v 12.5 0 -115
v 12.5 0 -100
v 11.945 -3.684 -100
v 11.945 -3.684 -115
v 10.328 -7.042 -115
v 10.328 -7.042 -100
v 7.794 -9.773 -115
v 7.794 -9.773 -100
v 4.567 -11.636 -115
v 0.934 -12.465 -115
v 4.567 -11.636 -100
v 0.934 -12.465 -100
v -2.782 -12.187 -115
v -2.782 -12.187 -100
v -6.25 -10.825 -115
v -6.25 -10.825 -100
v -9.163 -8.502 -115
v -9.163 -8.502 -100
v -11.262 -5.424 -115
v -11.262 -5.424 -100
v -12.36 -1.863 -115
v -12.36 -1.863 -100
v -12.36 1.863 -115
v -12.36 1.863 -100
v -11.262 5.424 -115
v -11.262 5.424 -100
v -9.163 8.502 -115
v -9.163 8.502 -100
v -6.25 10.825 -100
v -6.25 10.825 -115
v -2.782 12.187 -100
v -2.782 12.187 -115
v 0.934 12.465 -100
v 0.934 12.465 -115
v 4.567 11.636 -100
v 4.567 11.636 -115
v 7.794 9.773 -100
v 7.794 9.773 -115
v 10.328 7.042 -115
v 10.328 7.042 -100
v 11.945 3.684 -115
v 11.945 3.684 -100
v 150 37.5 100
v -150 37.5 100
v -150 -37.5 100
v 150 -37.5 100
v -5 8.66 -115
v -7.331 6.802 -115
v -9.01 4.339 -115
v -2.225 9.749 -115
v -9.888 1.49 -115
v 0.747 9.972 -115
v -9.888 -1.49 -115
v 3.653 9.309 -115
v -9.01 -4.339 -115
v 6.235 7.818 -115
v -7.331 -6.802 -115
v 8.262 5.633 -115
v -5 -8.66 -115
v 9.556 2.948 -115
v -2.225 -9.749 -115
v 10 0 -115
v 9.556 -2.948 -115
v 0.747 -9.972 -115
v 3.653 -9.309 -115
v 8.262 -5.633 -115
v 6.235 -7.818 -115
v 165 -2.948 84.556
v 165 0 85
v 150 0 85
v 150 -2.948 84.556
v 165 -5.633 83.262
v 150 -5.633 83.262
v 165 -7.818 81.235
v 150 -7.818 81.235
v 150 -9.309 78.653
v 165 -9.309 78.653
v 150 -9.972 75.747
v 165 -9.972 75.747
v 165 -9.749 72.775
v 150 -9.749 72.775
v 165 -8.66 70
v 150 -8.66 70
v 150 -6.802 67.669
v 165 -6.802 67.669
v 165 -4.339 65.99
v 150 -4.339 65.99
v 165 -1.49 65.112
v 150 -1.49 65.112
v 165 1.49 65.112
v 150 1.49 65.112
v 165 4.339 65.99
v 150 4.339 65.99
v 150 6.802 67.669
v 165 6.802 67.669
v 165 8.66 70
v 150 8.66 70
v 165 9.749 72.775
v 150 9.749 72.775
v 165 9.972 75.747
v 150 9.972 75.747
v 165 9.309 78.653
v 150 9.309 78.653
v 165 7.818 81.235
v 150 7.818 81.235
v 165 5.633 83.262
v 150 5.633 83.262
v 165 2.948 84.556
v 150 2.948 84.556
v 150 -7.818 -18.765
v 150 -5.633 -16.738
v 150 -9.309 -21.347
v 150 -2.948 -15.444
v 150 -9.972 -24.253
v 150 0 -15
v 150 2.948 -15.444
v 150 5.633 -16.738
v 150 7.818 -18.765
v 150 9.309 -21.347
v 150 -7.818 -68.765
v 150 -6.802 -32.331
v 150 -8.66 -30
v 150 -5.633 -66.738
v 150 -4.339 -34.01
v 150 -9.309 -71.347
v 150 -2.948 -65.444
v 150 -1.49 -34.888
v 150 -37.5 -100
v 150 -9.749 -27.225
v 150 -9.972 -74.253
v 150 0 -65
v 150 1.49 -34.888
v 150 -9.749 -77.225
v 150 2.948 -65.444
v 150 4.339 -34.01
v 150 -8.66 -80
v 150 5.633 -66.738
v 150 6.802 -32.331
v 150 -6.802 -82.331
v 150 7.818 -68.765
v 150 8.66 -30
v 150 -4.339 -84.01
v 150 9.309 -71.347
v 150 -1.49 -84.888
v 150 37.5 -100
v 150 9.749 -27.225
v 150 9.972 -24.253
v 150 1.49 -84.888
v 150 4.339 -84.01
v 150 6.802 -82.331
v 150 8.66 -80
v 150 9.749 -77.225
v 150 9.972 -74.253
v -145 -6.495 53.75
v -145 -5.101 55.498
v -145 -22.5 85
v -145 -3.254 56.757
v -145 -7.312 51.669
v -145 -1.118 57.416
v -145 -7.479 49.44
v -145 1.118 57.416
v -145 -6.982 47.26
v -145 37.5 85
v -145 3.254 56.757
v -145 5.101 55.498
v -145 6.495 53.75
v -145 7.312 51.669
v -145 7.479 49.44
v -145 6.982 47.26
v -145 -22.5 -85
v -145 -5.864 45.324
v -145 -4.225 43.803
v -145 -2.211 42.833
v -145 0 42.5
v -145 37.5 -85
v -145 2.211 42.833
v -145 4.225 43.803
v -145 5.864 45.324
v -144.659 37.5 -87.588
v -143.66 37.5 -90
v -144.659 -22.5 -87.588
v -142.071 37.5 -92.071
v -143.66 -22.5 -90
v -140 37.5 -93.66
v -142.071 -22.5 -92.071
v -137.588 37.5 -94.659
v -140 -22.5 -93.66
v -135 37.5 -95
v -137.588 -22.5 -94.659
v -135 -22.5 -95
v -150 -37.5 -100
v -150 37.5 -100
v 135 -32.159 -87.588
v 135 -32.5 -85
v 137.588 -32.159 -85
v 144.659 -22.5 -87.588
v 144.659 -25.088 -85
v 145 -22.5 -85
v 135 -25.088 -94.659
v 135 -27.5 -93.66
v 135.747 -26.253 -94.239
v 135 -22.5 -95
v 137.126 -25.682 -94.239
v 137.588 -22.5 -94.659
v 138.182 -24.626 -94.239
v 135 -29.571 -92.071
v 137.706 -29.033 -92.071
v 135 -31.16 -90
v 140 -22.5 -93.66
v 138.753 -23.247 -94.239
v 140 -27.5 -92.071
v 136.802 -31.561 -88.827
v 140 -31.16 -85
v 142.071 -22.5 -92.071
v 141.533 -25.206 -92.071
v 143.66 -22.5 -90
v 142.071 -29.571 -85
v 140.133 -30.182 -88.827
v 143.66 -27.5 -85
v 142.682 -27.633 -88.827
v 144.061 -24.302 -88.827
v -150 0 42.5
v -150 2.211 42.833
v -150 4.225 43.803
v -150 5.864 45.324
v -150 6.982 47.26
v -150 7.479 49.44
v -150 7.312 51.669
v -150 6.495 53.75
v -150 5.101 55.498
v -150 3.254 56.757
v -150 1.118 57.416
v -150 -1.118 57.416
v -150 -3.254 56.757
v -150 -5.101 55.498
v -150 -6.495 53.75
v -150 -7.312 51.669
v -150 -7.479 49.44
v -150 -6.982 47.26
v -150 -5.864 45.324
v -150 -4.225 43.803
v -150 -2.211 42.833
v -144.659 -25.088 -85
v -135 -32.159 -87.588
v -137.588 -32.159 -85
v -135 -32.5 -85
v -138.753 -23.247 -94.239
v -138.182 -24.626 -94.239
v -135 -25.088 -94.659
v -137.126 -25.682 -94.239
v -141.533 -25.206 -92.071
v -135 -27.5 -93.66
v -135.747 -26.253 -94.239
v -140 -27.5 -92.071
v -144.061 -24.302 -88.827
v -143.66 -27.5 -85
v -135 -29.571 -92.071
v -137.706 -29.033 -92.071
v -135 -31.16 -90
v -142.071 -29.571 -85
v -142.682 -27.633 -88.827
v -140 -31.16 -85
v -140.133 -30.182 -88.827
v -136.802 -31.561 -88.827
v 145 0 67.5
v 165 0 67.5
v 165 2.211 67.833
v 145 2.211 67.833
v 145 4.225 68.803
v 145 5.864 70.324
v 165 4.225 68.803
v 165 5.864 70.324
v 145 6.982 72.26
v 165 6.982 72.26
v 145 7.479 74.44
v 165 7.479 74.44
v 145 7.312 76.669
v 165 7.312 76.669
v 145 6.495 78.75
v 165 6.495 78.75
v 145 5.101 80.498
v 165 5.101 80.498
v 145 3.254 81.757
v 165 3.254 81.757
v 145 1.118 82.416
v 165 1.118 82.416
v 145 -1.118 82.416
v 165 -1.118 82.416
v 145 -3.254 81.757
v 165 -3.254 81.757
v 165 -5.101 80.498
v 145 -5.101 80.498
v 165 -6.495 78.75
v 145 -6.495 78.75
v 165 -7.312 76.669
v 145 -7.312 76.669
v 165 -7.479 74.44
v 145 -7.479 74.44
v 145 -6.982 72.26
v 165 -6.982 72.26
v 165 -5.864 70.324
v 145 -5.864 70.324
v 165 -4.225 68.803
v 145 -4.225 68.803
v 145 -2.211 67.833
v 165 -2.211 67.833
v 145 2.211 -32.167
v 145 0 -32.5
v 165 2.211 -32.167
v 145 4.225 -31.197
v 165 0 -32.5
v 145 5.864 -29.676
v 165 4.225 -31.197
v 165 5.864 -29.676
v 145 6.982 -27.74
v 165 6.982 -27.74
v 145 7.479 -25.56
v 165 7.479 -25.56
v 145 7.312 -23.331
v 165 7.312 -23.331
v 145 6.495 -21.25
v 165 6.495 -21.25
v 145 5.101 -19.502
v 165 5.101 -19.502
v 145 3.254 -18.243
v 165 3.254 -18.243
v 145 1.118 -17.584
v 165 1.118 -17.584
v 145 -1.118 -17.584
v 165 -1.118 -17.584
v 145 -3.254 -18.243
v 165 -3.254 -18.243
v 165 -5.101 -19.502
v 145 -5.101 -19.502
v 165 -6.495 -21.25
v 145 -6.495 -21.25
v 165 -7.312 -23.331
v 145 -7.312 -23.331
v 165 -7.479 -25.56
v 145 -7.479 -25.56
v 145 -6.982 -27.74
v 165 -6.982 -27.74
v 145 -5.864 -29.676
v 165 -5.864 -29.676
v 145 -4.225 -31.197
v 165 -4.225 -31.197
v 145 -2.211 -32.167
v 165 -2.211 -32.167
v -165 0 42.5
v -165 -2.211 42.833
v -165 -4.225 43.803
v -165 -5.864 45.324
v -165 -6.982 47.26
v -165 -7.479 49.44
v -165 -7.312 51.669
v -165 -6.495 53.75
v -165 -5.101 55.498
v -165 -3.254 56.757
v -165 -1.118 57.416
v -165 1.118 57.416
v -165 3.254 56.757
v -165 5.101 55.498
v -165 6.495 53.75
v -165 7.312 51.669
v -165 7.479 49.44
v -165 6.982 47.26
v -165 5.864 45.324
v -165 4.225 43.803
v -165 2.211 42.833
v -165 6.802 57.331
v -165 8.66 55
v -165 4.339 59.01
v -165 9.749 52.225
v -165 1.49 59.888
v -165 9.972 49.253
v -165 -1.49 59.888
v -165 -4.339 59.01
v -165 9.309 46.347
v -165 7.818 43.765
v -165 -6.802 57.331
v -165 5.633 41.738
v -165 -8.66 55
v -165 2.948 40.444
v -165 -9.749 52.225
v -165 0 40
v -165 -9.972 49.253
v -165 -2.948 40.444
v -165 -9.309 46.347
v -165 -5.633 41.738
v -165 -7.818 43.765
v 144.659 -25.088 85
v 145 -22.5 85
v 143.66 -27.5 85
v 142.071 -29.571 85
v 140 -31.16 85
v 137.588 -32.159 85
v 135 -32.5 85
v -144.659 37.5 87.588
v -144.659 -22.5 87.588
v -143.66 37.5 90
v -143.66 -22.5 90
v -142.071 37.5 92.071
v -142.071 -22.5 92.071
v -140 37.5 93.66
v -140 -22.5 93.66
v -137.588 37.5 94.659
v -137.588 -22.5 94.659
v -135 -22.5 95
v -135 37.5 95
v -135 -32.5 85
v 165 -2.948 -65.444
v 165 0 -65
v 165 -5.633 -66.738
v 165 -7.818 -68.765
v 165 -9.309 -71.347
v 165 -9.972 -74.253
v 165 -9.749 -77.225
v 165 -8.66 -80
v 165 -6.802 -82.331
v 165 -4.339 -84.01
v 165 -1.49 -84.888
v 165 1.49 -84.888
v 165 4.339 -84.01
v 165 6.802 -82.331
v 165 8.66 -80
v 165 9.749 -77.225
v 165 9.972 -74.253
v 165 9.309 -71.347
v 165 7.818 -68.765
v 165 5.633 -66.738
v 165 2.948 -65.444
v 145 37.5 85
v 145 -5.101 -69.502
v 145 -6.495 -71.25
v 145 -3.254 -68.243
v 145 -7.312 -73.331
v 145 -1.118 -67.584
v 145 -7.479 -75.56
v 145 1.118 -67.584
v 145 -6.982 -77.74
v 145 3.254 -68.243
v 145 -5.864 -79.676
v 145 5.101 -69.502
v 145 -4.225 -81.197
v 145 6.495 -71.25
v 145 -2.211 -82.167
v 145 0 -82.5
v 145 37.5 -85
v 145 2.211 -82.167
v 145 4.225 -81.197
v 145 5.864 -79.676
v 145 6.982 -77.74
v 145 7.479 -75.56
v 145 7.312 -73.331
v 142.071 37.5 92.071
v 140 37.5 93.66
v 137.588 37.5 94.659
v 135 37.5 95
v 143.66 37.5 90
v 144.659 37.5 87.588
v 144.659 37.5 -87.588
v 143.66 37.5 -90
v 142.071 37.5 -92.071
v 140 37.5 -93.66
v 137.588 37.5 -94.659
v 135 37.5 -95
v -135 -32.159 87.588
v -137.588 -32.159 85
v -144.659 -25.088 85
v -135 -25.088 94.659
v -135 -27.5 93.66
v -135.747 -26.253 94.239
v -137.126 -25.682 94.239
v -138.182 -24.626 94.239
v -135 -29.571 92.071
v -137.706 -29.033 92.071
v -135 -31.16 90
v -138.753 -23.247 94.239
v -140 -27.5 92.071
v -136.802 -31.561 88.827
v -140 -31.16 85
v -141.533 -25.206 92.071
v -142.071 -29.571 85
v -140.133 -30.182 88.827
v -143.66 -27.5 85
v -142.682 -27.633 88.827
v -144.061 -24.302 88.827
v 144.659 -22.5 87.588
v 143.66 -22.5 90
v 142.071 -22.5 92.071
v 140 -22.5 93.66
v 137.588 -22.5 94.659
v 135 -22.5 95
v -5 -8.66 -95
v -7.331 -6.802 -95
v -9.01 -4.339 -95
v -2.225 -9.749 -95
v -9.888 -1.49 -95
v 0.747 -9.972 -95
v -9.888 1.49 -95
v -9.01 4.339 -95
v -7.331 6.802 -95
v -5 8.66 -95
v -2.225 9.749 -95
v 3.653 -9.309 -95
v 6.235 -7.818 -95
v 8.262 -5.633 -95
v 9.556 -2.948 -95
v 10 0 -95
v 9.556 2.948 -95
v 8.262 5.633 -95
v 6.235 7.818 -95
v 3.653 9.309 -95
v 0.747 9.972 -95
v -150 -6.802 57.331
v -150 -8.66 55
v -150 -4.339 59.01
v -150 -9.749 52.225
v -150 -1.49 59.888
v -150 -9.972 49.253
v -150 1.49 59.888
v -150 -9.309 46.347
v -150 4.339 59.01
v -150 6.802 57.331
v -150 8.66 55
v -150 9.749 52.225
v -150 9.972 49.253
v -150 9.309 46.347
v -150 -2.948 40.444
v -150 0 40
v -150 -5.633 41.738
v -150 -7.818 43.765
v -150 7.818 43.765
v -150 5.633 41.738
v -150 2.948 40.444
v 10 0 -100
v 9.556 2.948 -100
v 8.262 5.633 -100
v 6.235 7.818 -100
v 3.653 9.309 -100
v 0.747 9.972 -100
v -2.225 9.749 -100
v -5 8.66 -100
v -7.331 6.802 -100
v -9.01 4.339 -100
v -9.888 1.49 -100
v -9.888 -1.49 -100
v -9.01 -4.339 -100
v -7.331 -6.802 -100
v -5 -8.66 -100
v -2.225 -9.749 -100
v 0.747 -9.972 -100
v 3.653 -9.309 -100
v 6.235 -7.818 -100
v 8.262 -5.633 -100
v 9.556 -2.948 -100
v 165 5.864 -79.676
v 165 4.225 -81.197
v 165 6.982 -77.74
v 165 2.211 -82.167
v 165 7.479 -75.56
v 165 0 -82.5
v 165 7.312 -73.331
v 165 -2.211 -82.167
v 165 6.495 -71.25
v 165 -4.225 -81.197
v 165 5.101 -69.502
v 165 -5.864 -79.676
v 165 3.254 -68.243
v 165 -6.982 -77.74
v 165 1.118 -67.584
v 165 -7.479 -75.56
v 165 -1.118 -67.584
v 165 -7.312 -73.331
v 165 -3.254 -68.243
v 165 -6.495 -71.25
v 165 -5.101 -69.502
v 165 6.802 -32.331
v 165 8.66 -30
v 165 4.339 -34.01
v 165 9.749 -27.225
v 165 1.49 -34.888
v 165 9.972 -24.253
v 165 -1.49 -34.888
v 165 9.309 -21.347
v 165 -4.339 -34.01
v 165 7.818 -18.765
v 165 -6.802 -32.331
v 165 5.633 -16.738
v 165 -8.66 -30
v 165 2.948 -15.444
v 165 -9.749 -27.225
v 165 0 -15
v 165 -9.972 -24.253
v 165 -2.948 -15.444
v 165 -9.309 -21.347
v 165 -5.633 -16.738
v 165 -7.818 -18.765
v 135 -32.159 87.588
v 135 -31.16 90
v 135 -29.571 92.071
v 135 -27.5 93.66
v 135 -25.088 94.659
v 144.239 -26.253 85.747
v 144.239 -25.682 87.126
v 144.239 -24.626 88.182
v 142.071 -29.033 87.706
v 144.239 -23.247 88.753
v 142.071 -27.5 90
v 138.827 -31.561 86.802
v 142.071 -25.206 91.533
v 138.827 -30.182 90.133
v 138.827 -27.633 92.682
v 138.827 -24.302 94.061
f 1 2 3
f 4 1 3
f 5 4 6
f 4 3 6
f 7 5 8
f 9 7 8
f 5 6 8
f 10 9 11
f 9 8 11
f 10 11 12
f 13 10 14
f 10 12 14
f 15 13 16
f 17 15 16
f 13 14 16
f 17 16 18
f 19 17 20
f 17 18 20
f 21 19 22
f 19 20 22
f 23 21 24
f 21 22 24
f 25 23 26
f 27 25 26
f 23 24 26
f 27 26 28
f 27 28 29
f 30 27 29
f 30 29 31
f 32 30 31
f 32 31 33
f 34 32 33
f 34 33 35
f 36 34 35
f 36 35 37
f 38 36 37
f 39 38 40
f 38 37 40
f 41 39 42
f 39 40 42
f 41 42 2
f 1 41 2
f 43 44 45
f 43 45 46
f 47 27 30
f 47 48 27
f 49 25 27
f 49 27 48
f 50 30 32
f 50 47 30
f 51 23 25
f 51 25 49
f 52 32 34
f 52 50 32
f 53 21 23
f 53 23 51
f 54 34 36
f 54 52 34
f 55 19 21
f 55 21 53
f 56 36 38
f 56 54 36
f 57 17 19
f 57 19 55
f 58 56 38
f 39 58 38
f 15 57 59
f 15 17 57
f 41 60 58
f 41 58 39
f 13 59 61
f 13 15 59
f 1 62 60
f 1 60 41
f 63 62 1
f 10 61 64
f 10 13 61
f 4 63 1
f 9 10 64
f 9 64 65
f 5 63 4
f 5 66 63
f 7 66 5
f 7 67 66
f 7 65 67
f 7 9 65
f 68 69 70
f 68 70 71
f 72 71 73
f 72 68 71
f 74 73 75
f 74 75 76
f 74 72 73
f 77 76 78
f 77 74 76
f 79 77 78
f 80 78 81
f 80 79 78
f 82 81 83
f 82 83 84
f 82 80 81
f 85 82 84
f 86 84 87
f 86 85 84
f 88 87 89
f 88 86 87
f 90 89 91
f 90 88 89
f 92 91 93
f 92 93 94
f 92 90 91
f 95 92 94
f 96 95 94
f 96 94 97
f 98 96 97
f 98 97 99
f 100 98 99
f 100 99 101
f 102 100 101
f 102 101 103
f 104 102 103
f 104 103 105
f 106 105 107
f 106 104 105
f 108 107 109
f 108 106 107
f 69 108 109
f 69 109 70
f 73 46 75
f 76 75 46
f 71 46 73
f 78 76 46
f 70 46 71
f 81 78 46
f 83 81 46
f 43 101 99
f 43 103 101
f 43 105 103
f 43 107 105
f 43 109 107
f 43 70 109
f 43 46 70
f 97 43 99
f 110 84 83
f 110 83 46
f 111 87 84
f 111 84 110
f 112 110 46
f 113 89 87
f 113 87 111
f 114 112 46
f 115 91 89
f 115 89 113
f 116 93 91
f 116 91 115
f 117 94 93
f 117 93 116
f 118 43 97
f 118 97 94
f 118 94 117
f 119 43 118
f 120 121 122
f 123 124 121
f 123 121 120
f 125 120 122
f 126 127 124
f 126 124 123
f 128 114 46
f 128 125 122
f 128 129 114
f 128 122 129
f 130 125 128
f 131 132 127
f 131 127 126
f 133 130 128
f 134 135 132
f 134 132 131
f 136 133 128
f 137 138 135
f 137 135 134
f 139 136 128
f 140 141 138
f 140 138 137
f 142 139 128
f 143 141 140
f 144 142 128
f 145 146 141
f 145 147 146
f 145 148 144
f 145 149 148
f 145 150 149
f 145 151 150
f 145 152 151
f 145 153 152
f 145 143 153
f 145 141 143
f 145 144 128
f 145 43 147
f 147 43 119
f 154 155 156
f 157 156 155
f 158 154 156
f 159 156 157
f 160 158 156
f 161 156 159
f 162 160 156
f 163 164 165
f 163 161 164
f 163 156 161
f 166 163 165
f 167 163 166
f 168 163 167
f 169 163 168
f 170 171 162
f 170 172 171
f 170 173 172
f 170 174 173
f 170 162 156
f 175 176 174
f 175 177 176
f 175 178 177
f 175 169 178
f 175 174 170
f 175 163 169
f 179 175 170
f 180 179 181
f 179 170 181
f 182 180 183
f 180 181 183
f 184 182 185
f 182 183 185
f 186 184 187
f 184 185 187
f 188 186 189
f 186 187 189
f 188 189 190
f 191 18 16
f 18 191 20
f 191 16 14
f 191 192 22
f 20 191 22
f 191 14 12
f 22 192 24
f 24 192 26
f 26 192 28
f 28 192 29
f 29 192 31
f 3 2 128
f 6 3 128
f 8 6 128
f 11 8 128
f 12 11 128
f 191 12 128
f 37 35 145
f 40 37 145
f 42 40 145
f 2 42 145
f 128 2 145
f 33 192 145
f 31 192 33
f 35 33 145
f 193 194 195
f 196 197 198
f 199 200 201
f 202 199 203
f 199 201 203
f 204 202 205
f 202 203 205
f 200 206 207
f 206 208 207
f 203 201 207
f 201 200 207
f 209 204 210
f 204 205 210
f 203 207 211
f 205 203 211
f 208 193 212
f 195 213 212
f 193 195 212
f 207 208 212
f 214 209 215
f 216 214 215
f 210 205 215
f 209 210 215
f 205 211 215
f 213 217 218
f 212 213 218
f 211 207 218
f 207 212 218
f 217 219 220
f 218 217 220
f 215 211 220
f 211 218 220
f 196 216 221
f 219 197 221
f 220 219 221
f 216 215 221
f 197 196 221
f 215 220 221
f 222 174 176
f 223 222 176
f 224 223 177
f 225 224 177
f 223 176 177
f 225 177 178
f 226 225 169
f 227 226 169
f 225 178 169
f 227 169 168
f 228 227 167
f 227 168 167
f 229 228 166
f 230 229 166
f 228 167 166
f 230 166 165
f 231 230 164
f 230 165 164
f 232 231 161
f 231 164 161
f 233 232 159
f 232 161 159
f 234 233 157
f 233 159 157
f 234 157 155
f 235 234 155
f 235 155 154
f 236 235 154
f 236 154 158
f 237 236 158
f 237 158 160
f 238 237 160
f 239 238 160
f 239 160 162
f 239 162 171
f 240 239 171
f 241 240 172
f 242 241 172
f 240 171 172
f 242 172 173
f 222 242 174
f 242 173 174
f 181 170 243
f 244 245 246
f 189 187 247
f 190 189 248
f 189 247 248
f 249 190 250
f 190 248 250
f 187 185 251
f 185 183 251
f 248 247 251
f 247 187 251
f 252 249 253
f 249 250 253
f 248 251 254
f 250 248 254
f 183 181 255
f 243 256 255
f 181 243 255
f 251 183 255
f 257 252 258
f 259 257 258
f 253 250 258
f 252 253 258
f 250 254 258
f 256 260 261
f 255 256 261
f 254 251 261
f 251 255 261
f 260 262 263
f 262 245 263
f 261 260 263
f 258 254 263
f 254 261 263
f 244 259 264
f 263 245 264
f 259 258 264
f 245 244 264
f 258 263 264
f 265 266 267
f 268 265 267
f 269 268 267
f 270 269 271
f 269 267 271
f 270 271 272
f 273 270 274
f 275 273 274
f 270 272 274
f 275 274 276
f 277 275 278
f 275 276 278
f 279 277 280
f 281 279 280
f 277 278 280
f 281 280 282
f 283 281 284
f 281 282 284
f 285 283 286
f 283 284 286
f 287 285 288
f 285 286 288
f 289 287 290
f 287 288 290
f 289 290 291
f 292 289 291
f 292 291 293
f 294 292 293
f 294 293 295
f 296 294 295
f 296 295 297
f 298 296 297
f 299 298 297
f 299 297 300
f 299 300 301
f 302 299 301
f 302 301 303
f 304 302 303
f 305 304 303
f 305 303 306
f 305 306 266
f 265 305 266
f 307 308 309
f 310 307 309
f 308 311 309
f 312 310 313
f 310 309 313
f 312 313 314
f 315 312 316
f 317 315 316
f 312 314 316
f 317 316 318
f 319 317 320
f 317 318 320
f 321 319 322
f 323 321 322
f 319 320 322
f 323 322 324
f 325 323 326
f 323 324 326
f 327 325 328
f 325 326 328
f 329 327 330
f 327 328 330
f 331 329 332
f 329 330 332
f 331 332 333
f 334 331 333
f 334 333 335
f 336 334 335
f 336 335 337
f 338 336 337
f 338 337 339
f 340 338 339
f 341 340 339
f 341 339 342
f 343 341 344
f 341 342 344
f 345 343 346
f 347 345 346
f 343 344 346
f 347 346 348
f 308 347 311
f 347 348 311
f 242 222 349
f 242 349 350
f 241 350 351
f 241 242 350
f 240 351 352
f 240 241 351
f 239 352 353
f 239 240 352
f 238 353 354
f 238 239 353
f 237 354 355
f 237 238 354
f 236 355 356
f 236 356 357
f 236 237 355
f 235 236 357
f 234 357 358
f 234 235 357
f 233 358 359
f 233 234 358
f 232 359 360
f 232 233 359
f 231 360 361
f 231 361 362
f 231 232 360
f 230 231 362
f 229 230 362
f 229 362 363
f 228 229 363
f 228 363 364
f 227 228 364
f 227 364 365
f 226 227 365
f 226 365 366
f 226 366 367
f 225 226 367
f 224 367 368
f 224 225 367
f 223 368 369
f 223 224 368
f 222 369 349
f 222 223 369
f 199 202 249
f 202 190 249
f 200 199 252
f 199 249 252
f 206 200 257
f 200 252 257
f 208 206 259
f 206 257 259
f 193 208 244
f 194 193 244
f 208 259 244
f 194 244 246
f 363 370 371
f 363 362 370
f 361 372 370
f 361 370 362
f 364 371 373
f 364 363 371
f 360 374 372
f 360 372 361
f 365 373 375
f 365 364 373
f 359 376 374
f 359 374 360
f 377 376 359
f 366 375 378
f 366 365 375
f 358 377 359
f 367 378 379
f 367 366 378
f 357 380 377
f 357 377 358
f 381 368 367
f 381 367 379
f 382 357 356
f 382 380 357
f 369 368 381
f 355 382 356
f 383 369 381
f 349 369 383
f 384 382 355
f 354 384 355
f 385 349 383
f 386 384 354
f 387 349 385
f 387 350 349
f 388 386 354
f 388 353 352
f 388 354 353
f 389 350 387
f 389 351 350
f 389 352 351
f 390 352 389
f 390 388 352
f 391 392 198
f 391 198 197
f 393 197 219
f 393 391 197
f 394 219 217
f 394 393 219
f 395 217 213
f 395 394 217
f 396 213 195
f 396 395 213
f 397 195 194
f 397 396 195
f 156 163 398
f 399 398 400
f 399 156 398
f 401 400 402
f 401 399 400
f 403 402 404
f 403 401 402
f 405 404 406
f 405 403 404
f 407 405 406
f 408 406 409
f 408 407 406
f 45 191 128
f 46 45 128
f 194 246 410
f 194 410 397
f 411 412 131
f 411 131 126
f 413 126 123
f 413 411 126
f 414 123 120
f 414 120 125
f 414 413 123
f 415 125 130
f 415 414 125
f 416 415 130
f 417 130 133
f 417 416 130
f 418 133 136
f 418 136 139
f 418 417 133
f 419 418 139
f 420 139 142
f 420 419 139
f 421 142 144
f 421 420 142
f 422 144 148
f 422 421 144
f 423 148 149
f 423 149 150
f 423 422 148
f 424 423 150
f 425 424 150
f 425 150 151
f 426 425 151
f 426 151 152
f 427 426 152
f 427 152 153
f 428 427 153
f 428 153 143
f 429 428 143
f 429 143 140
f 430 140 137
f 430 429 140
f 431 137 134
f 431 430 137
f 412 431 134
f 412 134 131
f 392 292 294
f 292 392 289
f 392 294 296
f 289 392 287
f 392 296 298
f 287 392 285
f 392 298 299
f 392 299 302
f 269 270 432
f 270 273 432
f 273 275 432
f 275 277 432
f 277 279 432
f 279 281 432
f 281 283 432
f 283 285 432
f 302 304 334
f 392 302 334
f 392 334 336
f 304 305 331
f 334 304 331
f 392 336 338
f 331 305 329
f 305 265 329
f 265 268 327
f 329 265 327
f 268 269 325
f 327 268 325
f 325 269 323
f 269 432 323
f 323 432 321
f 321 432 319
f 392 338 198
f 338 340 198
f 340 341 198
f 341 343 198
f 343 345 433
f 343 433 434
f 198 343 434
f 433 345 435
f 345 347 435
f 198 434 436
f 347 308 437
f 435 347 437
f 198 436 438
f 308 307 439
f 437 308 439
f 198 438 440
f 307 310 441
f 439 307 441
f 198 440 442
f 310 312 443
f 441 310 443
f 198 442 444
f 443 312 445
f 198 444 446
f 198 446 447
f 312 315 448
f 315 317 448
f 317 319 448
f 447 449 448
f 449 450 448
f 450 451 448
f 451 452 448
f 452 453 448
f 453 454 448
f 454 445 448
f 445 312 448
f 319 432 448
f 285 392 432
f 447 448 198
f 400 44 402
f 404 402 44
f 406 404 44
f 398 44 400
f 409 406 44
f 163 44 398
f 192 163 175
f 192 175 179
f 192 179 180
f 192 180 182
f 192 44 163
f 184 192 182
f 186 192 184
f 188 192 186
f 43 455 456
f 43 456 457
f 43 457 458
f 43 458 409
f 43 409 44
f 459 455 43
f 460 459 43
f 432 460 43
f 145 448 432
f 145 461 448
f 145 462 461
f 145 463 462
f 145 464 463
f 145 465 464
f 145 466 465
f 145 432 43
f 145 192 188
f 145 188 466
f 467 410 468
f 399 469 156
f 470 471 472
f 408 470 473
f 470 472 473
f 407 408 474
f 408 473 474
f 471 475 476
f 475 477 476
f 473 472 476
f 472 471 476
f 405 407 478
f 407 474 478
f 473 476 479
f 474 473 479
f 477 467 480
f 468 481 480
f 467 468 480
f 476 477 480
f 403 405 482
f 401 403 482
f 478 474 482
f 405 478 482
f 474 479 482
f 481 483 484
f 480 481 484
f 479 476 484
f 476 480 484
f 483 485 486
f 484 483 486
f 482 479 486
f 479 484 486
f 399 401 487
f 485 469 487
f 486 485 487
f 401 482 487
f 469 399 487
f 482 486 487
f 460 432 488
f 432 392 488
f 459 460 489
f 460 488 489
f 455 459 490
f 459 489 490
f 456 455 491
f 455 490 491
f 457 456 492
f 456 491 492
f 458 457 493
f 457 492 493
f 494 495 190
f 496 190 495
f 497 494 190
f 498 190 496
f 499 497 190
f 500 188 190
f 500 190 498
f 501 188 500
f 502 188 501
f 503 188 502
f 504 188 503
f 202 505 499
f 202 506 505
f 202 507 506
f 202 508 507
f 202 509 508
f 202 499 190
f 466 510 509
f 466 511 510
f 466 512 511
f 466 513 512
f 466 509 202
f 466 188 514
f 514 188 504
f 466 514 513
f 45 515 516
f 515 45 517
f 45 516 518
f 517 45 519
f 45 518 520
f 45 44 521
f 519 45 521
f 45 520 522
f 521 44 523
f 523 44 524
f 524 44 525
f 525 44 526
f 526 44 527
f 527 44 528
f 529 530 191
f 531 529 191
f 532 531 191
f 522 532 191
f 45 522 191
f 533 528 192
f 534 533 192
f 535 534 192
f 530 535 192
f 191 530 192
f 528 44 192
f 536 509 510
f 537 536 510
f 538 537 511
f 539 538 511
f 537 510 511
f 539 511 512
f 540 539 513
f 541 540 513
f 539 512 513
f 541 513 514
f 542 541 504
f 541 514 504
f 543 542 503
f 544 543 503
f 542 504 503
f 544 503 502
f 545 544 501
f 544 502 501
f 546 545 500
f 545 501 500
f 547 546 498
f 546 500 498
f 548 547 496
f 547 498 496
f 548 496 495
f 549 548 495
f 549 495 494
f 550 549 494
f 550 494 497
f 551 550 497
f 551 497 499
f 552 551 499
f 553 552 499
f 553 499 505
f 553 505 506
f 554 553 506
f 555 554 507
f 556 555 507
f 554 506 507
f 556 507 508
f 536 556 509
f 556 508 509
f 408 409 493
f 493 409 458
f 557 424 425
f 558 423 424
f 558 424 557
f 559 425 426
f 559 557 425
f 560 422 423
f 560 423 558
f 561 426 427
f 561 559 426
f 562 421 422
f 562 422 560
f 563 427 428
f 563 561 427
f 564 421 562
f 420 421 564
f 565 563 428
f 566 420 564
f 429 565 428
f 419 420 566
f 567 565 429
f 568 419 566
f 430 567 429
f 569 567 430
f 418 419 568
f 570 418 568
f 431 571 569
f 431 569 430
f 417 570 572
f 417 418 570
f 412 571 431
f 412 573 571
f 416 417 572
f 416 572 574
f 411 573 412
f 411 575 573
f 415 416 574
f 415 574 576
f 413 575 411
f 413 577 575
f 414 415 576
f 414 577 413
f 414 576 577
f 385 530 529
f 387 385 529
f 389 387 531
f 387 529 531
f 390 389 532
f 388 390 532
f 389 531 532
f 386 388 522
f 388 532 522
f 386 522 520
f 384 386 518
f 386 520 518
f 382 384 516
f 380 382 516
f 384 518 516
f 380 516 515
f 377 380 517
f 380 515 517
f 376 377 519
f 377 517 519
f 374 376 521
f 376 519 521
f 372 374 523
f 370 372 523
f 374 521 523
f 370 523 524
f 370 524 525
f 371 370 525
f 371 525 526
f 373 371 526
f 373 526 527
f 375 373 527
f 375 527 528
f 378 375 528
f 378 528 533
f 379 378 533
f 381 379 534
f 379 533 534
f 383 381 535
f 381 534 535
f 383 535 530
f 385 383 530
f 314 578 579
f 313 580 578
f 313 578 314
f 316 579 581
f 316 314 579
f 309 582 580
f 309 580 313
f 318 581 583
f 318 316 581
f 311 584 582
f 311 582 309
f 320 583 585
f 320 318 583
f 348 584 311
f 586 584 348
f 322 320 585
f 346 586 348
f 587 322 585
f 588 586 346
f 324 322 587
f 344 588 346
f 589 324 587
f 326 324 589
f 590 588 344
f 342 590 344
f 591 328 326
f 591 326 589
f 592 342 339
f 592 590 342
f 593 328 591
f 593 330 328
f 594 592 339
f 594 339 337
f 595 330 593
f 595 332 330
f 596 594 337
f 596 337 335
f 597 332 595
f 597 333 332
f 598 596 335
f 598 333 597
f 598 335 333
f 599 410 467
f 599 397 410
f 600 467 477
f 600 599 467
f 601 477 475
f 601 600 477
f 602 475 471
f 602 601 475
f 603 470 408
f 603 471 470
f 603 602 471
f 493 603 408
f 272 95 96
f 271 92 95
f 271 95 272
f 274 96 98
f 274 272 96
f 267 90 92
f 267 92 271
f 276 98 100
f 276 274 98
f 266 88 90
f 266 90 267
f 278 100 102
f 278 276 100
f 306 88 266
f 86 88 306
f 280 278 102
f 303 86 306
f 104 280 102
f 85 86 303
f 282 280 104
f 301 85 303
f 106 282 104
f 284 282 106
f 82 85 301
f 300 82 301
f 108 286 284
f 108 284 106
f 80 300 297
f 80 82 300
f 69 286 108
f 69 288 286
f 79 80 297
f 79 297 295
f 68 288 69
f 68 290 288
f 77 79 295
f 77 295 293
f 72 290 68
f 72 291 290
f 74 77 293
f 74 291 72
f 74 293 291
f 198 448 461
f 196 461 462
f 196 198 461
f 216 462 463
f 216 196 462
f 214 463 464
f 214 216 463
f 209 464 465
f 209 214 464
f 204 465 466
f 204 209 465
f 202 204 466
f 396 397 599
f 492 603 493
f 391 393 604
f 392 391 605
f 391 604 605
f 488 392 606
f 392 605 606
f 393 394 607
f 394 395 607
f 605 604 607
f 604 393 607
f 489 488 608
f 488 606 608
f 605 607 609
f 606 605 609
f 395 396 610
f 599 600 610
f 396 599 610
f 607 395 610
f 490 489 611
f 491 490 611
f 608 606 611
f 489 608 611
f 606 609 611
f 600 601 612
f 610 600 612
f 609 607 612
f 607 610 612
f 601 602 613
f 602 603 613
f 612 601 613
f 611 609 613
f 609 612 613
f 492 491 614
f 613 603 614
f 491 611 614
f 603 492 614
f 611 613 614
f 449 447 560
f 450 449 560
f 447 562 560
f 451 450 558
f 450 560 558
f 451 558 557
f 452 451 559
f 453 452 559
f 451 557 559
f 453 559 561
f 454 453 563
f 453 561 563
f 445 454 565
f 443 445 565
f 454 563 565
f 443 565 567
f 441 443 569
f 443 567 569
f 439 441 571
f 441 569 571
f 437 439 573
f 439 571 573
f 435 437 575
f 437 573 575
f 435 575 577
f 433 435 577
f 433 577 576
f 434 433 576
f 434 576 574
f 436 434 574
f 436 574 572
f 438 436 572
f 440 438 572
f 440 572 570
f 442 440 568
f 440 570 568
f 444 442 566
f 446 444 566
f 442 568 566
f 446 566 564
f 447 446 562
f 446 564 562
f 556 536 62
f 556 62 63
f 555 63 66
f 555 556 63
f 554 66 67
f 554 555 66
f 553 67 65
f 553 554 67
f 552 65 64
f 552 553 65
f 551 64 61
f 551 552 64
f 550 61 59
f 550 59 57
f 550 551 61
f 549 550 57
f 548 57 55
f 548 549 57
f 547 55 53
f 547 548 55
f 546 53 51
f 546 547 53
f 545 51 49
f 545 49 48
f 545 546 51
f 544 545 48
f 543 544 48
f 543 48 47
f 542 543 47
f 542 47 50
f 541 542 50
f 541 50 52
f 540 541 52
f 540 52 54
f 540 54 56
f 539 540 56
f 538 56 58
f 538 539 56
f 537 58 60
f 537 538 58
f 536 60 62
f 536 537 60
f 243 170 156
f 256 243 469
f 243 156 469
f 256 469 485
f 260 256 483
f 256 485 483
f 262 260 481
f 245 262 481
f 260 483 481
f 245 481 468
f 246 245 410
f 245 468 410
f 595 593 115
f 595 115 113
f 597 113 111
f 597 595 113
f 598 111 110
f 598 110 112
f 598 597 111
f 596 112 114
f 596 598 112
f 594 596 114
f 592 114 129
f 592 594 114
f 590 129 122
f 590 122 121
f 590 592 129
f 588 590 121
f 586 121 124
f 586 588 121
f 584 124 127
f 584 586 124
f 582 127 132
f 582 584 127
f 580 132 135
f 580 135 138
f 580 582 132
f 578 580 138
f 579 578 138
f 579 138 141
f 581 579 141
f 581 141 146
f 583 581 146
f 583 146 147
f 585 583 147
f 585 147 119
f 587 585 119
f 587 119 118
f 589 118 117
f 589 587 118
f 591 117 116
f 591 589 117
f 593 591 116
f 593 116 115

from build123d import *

# Parameters (mm, degrees)
SKETCH1_W           = 300
SKETCH1_H           = 200
BOSS_EXTRUDE1_DEPTH = 37.5
SHELL1_T            = -5
FILLET1_R           = 10
SKETCH2_R           = 7.5
CUT_EXTRUDE1_DEPTH  = 5
SKETCH3_R           = 7.5
CUT_EXTRUDE2_DEPTH  = 5
SKETCH4_R           = 10
CUT_EXTRUDE3_DEPTH  = 5
BOSS_EXTRUDE2_START = 15
SKETCH5_R           = 10
SKETCH5_R_2         = 7.5
BOSS_EXTRUDE2_DEPTH = 15
SKETCH6_R           = 10
SKETCH6_R_2         = 7.5
BOSS_EXTRUDE3_DEPTH = 15
SKETCH7_R           = 12.5
SKETCH7_R_2         = 10
BOSS_EXTRUDE4_DEPTH = 15


with BuildPart() as part:
    # Sketch1 → Boss-Extrude1 (new, symmetric)
    with BuildSketch(Plane(origin=(0, 0, 0), x_dir=(1, 0, 0), z_dir=(0, 1, 0))):
        Rectangle(SKETCH1_W, SKETCH1_H)
    extrude(amount=BOSS_EXTRUDE1_DEPTH, both=True)

    # Shell1
    shell1_openings = [part.faces().sort_by_distance(p)[0] for p in [
        (0, 37.5, 0),
    ]]
    offset(amount=SHELL1_T, openings=shell1_openings, kind=Kind.INTERSECTION)

    # Fillet1
    fillet1_edges = [part.edges().sort_by_distance(p)[0] for p in [
        (-145, -32.5, 0),
        (-145, 2.5, -95),
        (0, -32.5, 95),
        (-145, 2.5, 95),
        (145, -32.5, 0),
        (145, 2.5, 95),
        (0, -32.5, -95),
        (145, 2.5, -95),
    ]]
    fillet(fillet1_edges, radius=FILLET1_R)

    # Sketch2 → Cut-Extrude1 (cut)
    with BuildSketch(Plane(origin=(150, 0, 0), x_dir=(0, 0, -1), z_dir=(1, 0, 0))):
        with Locations((75, 0)):
            Circle(SKETCH2_R)
        with Locations((25, 0)):
            Circle(SKETCH2_R)
        with Locations((-75, 0)):
            Circle(SKETCH2_R)
    extrude(amount=-CUT_EXTRUDE1_DEPTH, mode=Mode.SUBTRACT)

    # Sketch3 → Cut-Extrude2 (cut)
    with BuildSketch(Plane(origin=(-145, 0, 0), x_dir=(0, 0, -1), z_dir=(1, 0, 0))):
        with Locations((-50, 0)):
            Circle(SKETCH3_R)
    extrude(amount=-CUT_EXTRUDE2_DEPTH, mode=Mode.SUBTRACT)

    # Sketch4 → Cut-Extrude3 (cut)
    with BuildSketch(Plane.XY.offset(-95)):
        Circle(SKETCH4_R)
    extrude(amount=-CUT_EXTRUDE3_DEPTH, mode=Mode.SUBTRACT)

    # Sketch5 → Boss-Extrude2 (add)
    # profile 1 of 3: a face of its own
    with BuildSketch(Plane(origin=(150, 0, 0), x_dir=(0, 0, -1), z_dir=(1, 0, 0)).offset(BOSS_EXTRUDE2_START)):
        with Locations(Location((-75, 0, 0), (0, 0, 180))):
            Circle(SKETCH5_R)
        with Locations((-75, 0)):
            Circle(SKETCH5_R_2, mode=Mode.SUBTRACT)
    # profile 2 of 3: a face of its own
    with BuildSketch(Plane(origin=(150, 0, 0), x_dir=(0, 0, -1), z_dir=(1, 0, 0)).offset(BOSS_EXTRUDE2_START)):
        with Locations(Location((25, 0, 0), (0, 0, 180))):
            Circle(SKETCH5_R)
        with Locations((25, 0)):
            Circle(SKETCH5_R_2, mode=Mode.SUBTRACT)
    # profile 3 of 3: a face of its own
    with BuildSketch(Plane(origin=(150, 0, 0), x_dir=(0, 0, -1), z_dir=(1, 0, 0)).offset(BOSS_EXTRUDE2_START)):
        with Locations(Location((75, 0, 0), (0, 0, 180))):
            Circle(SKETCH5_R)
        with Locations((75, 0)):
            Circle(SKETCH5_R_2, mode=Mode.SUBTRACT)
    extrude(amount=-BOSS_EXTRUDE2_DEPTH)

    # Sketch6 → Boss-Extrude3 (add)
    with BuildSketch(Plane.ZY.offset(150)):
        with Locations(Location((50, 0, 0), (0, 0, 180))):
            Circle(SKETCH6_R)
        with Locations(Location((50, 0, 0), (0, 0, 180))):
            Circle(SKETCH6_R_2, mode=Mode.SUBTRACT)
    extrude(amount=BOSS_EXTRUDE3_DEPTH)

    # Sketch7 → Boss-Extrude4 (add)
    with BuildSketch(Plane(origin=(0, 0, -100), x_dir=(-1, 0, 0), z_dir=(0, 0, -1))):
        with Locations(Location((0, 0, 0), (0, 0, 180))):
            Circle(SKETCH7_R)
        with Locations(Location((0, 0, 0), (0, 0, 180))):
            Circle(SKETCH7_R_2, mode=Mode.SUBTRACT)
    extrude(amount=BOSS_EXTRUDE4_DEPTH)


solid = part.part
